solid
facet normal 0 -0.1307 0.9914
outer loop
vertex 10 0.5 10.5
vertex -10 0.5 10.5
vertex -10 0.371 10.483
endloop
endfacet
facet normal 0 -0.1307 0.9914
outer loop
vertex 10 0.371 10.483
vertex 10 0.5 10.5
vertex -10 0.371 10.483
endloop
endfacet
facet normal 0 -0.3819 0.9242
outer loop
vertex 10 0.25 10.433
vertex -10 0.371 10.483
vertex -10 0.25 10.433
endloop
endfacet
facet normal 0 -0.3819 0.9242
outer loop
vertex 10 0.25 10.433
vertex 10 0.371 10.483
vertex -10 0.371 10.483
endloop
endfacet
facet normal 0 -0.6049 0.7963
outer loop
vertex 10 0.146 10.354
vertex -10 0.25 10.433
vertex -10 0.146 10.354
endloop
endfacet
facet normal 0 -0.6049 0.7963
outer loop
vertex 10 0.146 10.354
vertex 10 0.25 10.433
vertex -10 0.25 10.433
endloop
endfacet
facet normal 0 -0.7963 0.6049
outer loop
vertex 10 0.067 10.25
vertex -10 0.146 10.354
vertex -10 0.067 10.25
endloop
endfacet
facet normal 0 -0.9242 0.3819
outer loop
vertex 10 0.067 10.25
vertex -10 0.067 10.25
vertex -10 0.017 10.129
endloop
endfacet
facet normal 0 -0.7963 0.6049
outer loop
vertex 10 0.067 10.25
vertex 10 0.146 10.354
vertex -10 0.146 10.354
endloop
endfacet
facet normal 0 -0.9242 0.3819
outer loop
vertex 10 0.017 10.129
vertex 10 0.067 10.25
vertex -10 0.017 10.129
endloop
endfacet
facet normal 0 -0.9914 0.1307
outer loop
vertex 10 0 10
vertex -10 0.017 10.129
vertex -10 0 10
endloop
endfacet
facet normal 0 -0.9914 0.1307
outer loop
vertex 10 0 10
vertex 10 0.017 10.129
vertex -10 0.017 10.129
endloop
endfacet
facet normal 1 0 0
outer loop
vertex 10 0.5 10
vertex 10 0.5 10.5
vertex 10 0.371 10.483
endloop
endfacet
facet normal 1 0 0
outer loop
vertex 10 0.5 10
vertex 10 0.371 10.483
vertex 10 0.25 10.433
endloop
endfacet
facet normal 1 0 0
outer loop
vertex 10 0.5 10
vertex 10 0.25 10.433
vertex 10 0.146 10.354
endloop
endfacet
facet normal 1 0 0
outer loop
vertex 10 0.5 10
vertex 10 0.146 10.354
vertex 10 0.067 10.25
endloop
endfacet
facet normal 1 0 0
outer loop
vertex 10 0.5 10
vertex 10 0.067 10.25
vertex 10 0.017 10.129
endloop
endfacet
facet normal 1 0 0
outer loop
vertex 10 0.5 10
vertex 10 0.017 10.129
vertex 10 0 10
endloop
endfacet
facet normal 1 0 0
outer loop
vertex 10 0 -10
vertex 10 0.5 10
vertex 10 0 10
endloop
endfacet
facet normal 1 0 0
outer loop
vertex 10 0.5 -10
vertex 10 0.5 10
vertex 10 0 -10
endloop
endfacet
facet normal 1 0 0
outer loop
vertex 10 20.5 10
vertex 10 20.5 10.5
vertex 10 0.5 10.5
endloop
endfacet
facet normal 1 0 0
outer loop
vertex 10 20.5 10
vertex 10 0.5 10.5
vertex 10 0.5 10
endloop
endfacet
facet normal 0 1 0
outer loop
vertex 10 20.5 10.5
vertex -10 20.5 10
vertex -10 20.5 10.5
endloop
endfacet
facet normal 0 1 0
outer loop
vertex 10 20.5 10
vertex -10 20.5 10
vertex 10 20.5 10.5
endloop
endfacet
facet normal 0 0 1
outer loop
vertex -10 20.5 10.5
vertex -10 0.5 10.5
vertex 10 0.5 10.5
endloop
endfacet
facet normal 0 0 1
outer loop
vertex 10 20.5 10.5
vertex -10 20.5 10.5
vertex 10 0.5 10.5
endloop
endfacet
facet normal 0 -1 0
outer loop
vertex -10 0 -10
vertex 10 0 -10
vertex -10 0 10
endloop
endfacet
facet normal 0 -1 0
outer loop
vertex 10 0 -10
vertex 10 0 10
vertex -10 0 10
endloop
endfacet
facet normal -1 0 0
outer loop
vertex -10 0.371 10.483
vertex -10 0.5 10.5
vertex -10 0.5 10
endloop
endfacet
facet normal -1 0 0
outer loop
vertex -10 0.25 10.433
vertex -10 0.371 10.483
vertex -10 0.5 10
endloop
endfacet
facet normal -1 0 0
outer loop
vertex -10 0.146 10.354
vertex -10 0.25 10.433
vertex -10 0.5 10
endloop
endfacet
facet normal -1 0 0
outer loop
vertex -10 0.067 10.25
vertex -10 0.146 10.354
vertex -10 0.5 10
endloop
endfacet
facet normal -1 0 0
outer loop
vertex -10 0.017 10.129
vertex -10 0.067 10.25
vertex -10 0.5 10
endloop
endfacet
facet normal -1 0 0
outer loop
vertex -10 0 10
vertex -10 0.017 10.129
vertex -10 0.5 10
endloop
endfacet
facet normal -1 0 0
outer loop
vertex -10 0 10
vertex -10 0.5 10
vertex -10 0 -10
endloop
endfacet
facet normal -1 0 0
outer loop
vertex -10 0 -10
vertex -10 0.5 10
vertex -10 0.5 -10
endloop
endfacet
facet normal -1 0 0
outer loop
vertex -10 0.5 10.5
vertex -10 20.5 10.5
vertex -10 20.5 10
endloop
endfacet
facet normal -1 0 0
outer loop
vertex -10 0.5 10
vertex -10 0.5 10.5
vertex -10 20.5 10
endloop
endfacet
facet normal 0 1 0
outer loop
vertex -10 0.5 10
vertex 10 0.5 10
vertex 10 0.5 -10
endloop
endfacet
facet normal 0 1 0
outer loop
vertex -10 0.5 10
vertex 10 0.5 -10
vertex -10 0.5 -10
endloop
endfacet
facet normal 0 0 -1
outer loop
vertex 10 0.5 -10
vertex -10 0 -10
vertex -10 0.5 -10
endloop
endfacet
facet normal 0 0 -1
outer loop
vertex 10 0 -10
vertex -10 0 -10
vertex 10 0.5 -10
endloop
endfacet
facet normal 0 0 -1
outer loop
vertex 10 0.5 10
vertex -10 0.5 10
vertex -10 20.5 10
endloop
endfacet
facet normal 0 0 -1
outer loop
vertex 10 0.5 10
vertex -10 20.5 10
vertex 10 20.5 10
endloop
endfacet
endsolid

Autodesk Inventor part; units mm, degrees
ref_plane "YZ Plane" through (0, 0, 0) normal (1, 0, 0) x (0, 1, 0)
ref_plane "XZ Plane" through (0, 0, 0) normal (0, 1, 0) x (-1, 0, 0)
ref_plane "XY Plane" through (0, 0, 0) normal (0, 0, 1) x (1, 0, 0)
sketch "Sketch1" plane through (0, 0, 0) normal (0, 1, 0) x (-1, 0, 0)
  line L0 (-10, 10) -> (10, 10)
  line L1 (10, 10) -> (10, -10)
  line L2 (10, -10) -> (-10, -10)
  line L3 (-10, -10) -> (-10, 10)
  line L4 (-10, 10) -> (10, -10) construction
  line L5 (10, 10) -> (-10, -10) construction
  point P0 (0, 0)
  dimension "d0" = 20
  dimension "d1" = 20
extrude "Extrusion1" add sketch "Sketch1" along normal blind 0.5
sketch "Sketch2" plane through (0, 0.5, 0) normal (0, 1, 0) x (1, 0, 0)
  line L0 (10, 10) -> (-10, 10) projected
  line L1 (-10, 10) -> (-10, -10) projected
  line L2 (-10, -10) -> (10, -10) projected
  line L3 (10, -10) -> (10, 10) projected
  line L4 (-10, -10) -> (10, -10) projected
  line L5 (10, -10) -> (-10, -10)
  line L6 (-10, -10) -> (-10, -10.5)
  line L7 (-10, -10.5) -> (10, -10.5)
  line L8 (10, -10.5) -> (10, -10)
  point P0 (0, 0)
  dimension "d4" = 0.5
extrude "Extrusion2" add sketch "Sketch2" along normal blind 20 contours L8 L7 L6 L2
sketch "Sketch3" plane through (10, 0.5, 10.5) normal (1, 0, 0) x (0, 0, -1)
  line L0 (0.5, 0) -> (20.5, 0) projected
  line L1 (0.5, -0.5) -> (0.5, 0) projected
  circle A0 centre (0.5, 0) radius 0.5
  line L2 (0, 0) -> (0.5, 0) projected
  line L3 (0.5, 0) -> (0.5, 20) projected
  line L4 (0, 20) -> (0.5, 20) projected
  line L5 (0, 0) -> (0, 20) projected
  point P0 (10.5, -0.5)
extrude "Extrusion3" add sketch "Sketch3" against normal up to surface (20 mm away) contours L1 A0 L2
sketch "Sketch4" plane through (0, 0.5, 0) normal (0, 1, 0) x (1, 0, 0)
  point P0 (0, 0)
properties part number "l bracket" material "Stainless Steel"
